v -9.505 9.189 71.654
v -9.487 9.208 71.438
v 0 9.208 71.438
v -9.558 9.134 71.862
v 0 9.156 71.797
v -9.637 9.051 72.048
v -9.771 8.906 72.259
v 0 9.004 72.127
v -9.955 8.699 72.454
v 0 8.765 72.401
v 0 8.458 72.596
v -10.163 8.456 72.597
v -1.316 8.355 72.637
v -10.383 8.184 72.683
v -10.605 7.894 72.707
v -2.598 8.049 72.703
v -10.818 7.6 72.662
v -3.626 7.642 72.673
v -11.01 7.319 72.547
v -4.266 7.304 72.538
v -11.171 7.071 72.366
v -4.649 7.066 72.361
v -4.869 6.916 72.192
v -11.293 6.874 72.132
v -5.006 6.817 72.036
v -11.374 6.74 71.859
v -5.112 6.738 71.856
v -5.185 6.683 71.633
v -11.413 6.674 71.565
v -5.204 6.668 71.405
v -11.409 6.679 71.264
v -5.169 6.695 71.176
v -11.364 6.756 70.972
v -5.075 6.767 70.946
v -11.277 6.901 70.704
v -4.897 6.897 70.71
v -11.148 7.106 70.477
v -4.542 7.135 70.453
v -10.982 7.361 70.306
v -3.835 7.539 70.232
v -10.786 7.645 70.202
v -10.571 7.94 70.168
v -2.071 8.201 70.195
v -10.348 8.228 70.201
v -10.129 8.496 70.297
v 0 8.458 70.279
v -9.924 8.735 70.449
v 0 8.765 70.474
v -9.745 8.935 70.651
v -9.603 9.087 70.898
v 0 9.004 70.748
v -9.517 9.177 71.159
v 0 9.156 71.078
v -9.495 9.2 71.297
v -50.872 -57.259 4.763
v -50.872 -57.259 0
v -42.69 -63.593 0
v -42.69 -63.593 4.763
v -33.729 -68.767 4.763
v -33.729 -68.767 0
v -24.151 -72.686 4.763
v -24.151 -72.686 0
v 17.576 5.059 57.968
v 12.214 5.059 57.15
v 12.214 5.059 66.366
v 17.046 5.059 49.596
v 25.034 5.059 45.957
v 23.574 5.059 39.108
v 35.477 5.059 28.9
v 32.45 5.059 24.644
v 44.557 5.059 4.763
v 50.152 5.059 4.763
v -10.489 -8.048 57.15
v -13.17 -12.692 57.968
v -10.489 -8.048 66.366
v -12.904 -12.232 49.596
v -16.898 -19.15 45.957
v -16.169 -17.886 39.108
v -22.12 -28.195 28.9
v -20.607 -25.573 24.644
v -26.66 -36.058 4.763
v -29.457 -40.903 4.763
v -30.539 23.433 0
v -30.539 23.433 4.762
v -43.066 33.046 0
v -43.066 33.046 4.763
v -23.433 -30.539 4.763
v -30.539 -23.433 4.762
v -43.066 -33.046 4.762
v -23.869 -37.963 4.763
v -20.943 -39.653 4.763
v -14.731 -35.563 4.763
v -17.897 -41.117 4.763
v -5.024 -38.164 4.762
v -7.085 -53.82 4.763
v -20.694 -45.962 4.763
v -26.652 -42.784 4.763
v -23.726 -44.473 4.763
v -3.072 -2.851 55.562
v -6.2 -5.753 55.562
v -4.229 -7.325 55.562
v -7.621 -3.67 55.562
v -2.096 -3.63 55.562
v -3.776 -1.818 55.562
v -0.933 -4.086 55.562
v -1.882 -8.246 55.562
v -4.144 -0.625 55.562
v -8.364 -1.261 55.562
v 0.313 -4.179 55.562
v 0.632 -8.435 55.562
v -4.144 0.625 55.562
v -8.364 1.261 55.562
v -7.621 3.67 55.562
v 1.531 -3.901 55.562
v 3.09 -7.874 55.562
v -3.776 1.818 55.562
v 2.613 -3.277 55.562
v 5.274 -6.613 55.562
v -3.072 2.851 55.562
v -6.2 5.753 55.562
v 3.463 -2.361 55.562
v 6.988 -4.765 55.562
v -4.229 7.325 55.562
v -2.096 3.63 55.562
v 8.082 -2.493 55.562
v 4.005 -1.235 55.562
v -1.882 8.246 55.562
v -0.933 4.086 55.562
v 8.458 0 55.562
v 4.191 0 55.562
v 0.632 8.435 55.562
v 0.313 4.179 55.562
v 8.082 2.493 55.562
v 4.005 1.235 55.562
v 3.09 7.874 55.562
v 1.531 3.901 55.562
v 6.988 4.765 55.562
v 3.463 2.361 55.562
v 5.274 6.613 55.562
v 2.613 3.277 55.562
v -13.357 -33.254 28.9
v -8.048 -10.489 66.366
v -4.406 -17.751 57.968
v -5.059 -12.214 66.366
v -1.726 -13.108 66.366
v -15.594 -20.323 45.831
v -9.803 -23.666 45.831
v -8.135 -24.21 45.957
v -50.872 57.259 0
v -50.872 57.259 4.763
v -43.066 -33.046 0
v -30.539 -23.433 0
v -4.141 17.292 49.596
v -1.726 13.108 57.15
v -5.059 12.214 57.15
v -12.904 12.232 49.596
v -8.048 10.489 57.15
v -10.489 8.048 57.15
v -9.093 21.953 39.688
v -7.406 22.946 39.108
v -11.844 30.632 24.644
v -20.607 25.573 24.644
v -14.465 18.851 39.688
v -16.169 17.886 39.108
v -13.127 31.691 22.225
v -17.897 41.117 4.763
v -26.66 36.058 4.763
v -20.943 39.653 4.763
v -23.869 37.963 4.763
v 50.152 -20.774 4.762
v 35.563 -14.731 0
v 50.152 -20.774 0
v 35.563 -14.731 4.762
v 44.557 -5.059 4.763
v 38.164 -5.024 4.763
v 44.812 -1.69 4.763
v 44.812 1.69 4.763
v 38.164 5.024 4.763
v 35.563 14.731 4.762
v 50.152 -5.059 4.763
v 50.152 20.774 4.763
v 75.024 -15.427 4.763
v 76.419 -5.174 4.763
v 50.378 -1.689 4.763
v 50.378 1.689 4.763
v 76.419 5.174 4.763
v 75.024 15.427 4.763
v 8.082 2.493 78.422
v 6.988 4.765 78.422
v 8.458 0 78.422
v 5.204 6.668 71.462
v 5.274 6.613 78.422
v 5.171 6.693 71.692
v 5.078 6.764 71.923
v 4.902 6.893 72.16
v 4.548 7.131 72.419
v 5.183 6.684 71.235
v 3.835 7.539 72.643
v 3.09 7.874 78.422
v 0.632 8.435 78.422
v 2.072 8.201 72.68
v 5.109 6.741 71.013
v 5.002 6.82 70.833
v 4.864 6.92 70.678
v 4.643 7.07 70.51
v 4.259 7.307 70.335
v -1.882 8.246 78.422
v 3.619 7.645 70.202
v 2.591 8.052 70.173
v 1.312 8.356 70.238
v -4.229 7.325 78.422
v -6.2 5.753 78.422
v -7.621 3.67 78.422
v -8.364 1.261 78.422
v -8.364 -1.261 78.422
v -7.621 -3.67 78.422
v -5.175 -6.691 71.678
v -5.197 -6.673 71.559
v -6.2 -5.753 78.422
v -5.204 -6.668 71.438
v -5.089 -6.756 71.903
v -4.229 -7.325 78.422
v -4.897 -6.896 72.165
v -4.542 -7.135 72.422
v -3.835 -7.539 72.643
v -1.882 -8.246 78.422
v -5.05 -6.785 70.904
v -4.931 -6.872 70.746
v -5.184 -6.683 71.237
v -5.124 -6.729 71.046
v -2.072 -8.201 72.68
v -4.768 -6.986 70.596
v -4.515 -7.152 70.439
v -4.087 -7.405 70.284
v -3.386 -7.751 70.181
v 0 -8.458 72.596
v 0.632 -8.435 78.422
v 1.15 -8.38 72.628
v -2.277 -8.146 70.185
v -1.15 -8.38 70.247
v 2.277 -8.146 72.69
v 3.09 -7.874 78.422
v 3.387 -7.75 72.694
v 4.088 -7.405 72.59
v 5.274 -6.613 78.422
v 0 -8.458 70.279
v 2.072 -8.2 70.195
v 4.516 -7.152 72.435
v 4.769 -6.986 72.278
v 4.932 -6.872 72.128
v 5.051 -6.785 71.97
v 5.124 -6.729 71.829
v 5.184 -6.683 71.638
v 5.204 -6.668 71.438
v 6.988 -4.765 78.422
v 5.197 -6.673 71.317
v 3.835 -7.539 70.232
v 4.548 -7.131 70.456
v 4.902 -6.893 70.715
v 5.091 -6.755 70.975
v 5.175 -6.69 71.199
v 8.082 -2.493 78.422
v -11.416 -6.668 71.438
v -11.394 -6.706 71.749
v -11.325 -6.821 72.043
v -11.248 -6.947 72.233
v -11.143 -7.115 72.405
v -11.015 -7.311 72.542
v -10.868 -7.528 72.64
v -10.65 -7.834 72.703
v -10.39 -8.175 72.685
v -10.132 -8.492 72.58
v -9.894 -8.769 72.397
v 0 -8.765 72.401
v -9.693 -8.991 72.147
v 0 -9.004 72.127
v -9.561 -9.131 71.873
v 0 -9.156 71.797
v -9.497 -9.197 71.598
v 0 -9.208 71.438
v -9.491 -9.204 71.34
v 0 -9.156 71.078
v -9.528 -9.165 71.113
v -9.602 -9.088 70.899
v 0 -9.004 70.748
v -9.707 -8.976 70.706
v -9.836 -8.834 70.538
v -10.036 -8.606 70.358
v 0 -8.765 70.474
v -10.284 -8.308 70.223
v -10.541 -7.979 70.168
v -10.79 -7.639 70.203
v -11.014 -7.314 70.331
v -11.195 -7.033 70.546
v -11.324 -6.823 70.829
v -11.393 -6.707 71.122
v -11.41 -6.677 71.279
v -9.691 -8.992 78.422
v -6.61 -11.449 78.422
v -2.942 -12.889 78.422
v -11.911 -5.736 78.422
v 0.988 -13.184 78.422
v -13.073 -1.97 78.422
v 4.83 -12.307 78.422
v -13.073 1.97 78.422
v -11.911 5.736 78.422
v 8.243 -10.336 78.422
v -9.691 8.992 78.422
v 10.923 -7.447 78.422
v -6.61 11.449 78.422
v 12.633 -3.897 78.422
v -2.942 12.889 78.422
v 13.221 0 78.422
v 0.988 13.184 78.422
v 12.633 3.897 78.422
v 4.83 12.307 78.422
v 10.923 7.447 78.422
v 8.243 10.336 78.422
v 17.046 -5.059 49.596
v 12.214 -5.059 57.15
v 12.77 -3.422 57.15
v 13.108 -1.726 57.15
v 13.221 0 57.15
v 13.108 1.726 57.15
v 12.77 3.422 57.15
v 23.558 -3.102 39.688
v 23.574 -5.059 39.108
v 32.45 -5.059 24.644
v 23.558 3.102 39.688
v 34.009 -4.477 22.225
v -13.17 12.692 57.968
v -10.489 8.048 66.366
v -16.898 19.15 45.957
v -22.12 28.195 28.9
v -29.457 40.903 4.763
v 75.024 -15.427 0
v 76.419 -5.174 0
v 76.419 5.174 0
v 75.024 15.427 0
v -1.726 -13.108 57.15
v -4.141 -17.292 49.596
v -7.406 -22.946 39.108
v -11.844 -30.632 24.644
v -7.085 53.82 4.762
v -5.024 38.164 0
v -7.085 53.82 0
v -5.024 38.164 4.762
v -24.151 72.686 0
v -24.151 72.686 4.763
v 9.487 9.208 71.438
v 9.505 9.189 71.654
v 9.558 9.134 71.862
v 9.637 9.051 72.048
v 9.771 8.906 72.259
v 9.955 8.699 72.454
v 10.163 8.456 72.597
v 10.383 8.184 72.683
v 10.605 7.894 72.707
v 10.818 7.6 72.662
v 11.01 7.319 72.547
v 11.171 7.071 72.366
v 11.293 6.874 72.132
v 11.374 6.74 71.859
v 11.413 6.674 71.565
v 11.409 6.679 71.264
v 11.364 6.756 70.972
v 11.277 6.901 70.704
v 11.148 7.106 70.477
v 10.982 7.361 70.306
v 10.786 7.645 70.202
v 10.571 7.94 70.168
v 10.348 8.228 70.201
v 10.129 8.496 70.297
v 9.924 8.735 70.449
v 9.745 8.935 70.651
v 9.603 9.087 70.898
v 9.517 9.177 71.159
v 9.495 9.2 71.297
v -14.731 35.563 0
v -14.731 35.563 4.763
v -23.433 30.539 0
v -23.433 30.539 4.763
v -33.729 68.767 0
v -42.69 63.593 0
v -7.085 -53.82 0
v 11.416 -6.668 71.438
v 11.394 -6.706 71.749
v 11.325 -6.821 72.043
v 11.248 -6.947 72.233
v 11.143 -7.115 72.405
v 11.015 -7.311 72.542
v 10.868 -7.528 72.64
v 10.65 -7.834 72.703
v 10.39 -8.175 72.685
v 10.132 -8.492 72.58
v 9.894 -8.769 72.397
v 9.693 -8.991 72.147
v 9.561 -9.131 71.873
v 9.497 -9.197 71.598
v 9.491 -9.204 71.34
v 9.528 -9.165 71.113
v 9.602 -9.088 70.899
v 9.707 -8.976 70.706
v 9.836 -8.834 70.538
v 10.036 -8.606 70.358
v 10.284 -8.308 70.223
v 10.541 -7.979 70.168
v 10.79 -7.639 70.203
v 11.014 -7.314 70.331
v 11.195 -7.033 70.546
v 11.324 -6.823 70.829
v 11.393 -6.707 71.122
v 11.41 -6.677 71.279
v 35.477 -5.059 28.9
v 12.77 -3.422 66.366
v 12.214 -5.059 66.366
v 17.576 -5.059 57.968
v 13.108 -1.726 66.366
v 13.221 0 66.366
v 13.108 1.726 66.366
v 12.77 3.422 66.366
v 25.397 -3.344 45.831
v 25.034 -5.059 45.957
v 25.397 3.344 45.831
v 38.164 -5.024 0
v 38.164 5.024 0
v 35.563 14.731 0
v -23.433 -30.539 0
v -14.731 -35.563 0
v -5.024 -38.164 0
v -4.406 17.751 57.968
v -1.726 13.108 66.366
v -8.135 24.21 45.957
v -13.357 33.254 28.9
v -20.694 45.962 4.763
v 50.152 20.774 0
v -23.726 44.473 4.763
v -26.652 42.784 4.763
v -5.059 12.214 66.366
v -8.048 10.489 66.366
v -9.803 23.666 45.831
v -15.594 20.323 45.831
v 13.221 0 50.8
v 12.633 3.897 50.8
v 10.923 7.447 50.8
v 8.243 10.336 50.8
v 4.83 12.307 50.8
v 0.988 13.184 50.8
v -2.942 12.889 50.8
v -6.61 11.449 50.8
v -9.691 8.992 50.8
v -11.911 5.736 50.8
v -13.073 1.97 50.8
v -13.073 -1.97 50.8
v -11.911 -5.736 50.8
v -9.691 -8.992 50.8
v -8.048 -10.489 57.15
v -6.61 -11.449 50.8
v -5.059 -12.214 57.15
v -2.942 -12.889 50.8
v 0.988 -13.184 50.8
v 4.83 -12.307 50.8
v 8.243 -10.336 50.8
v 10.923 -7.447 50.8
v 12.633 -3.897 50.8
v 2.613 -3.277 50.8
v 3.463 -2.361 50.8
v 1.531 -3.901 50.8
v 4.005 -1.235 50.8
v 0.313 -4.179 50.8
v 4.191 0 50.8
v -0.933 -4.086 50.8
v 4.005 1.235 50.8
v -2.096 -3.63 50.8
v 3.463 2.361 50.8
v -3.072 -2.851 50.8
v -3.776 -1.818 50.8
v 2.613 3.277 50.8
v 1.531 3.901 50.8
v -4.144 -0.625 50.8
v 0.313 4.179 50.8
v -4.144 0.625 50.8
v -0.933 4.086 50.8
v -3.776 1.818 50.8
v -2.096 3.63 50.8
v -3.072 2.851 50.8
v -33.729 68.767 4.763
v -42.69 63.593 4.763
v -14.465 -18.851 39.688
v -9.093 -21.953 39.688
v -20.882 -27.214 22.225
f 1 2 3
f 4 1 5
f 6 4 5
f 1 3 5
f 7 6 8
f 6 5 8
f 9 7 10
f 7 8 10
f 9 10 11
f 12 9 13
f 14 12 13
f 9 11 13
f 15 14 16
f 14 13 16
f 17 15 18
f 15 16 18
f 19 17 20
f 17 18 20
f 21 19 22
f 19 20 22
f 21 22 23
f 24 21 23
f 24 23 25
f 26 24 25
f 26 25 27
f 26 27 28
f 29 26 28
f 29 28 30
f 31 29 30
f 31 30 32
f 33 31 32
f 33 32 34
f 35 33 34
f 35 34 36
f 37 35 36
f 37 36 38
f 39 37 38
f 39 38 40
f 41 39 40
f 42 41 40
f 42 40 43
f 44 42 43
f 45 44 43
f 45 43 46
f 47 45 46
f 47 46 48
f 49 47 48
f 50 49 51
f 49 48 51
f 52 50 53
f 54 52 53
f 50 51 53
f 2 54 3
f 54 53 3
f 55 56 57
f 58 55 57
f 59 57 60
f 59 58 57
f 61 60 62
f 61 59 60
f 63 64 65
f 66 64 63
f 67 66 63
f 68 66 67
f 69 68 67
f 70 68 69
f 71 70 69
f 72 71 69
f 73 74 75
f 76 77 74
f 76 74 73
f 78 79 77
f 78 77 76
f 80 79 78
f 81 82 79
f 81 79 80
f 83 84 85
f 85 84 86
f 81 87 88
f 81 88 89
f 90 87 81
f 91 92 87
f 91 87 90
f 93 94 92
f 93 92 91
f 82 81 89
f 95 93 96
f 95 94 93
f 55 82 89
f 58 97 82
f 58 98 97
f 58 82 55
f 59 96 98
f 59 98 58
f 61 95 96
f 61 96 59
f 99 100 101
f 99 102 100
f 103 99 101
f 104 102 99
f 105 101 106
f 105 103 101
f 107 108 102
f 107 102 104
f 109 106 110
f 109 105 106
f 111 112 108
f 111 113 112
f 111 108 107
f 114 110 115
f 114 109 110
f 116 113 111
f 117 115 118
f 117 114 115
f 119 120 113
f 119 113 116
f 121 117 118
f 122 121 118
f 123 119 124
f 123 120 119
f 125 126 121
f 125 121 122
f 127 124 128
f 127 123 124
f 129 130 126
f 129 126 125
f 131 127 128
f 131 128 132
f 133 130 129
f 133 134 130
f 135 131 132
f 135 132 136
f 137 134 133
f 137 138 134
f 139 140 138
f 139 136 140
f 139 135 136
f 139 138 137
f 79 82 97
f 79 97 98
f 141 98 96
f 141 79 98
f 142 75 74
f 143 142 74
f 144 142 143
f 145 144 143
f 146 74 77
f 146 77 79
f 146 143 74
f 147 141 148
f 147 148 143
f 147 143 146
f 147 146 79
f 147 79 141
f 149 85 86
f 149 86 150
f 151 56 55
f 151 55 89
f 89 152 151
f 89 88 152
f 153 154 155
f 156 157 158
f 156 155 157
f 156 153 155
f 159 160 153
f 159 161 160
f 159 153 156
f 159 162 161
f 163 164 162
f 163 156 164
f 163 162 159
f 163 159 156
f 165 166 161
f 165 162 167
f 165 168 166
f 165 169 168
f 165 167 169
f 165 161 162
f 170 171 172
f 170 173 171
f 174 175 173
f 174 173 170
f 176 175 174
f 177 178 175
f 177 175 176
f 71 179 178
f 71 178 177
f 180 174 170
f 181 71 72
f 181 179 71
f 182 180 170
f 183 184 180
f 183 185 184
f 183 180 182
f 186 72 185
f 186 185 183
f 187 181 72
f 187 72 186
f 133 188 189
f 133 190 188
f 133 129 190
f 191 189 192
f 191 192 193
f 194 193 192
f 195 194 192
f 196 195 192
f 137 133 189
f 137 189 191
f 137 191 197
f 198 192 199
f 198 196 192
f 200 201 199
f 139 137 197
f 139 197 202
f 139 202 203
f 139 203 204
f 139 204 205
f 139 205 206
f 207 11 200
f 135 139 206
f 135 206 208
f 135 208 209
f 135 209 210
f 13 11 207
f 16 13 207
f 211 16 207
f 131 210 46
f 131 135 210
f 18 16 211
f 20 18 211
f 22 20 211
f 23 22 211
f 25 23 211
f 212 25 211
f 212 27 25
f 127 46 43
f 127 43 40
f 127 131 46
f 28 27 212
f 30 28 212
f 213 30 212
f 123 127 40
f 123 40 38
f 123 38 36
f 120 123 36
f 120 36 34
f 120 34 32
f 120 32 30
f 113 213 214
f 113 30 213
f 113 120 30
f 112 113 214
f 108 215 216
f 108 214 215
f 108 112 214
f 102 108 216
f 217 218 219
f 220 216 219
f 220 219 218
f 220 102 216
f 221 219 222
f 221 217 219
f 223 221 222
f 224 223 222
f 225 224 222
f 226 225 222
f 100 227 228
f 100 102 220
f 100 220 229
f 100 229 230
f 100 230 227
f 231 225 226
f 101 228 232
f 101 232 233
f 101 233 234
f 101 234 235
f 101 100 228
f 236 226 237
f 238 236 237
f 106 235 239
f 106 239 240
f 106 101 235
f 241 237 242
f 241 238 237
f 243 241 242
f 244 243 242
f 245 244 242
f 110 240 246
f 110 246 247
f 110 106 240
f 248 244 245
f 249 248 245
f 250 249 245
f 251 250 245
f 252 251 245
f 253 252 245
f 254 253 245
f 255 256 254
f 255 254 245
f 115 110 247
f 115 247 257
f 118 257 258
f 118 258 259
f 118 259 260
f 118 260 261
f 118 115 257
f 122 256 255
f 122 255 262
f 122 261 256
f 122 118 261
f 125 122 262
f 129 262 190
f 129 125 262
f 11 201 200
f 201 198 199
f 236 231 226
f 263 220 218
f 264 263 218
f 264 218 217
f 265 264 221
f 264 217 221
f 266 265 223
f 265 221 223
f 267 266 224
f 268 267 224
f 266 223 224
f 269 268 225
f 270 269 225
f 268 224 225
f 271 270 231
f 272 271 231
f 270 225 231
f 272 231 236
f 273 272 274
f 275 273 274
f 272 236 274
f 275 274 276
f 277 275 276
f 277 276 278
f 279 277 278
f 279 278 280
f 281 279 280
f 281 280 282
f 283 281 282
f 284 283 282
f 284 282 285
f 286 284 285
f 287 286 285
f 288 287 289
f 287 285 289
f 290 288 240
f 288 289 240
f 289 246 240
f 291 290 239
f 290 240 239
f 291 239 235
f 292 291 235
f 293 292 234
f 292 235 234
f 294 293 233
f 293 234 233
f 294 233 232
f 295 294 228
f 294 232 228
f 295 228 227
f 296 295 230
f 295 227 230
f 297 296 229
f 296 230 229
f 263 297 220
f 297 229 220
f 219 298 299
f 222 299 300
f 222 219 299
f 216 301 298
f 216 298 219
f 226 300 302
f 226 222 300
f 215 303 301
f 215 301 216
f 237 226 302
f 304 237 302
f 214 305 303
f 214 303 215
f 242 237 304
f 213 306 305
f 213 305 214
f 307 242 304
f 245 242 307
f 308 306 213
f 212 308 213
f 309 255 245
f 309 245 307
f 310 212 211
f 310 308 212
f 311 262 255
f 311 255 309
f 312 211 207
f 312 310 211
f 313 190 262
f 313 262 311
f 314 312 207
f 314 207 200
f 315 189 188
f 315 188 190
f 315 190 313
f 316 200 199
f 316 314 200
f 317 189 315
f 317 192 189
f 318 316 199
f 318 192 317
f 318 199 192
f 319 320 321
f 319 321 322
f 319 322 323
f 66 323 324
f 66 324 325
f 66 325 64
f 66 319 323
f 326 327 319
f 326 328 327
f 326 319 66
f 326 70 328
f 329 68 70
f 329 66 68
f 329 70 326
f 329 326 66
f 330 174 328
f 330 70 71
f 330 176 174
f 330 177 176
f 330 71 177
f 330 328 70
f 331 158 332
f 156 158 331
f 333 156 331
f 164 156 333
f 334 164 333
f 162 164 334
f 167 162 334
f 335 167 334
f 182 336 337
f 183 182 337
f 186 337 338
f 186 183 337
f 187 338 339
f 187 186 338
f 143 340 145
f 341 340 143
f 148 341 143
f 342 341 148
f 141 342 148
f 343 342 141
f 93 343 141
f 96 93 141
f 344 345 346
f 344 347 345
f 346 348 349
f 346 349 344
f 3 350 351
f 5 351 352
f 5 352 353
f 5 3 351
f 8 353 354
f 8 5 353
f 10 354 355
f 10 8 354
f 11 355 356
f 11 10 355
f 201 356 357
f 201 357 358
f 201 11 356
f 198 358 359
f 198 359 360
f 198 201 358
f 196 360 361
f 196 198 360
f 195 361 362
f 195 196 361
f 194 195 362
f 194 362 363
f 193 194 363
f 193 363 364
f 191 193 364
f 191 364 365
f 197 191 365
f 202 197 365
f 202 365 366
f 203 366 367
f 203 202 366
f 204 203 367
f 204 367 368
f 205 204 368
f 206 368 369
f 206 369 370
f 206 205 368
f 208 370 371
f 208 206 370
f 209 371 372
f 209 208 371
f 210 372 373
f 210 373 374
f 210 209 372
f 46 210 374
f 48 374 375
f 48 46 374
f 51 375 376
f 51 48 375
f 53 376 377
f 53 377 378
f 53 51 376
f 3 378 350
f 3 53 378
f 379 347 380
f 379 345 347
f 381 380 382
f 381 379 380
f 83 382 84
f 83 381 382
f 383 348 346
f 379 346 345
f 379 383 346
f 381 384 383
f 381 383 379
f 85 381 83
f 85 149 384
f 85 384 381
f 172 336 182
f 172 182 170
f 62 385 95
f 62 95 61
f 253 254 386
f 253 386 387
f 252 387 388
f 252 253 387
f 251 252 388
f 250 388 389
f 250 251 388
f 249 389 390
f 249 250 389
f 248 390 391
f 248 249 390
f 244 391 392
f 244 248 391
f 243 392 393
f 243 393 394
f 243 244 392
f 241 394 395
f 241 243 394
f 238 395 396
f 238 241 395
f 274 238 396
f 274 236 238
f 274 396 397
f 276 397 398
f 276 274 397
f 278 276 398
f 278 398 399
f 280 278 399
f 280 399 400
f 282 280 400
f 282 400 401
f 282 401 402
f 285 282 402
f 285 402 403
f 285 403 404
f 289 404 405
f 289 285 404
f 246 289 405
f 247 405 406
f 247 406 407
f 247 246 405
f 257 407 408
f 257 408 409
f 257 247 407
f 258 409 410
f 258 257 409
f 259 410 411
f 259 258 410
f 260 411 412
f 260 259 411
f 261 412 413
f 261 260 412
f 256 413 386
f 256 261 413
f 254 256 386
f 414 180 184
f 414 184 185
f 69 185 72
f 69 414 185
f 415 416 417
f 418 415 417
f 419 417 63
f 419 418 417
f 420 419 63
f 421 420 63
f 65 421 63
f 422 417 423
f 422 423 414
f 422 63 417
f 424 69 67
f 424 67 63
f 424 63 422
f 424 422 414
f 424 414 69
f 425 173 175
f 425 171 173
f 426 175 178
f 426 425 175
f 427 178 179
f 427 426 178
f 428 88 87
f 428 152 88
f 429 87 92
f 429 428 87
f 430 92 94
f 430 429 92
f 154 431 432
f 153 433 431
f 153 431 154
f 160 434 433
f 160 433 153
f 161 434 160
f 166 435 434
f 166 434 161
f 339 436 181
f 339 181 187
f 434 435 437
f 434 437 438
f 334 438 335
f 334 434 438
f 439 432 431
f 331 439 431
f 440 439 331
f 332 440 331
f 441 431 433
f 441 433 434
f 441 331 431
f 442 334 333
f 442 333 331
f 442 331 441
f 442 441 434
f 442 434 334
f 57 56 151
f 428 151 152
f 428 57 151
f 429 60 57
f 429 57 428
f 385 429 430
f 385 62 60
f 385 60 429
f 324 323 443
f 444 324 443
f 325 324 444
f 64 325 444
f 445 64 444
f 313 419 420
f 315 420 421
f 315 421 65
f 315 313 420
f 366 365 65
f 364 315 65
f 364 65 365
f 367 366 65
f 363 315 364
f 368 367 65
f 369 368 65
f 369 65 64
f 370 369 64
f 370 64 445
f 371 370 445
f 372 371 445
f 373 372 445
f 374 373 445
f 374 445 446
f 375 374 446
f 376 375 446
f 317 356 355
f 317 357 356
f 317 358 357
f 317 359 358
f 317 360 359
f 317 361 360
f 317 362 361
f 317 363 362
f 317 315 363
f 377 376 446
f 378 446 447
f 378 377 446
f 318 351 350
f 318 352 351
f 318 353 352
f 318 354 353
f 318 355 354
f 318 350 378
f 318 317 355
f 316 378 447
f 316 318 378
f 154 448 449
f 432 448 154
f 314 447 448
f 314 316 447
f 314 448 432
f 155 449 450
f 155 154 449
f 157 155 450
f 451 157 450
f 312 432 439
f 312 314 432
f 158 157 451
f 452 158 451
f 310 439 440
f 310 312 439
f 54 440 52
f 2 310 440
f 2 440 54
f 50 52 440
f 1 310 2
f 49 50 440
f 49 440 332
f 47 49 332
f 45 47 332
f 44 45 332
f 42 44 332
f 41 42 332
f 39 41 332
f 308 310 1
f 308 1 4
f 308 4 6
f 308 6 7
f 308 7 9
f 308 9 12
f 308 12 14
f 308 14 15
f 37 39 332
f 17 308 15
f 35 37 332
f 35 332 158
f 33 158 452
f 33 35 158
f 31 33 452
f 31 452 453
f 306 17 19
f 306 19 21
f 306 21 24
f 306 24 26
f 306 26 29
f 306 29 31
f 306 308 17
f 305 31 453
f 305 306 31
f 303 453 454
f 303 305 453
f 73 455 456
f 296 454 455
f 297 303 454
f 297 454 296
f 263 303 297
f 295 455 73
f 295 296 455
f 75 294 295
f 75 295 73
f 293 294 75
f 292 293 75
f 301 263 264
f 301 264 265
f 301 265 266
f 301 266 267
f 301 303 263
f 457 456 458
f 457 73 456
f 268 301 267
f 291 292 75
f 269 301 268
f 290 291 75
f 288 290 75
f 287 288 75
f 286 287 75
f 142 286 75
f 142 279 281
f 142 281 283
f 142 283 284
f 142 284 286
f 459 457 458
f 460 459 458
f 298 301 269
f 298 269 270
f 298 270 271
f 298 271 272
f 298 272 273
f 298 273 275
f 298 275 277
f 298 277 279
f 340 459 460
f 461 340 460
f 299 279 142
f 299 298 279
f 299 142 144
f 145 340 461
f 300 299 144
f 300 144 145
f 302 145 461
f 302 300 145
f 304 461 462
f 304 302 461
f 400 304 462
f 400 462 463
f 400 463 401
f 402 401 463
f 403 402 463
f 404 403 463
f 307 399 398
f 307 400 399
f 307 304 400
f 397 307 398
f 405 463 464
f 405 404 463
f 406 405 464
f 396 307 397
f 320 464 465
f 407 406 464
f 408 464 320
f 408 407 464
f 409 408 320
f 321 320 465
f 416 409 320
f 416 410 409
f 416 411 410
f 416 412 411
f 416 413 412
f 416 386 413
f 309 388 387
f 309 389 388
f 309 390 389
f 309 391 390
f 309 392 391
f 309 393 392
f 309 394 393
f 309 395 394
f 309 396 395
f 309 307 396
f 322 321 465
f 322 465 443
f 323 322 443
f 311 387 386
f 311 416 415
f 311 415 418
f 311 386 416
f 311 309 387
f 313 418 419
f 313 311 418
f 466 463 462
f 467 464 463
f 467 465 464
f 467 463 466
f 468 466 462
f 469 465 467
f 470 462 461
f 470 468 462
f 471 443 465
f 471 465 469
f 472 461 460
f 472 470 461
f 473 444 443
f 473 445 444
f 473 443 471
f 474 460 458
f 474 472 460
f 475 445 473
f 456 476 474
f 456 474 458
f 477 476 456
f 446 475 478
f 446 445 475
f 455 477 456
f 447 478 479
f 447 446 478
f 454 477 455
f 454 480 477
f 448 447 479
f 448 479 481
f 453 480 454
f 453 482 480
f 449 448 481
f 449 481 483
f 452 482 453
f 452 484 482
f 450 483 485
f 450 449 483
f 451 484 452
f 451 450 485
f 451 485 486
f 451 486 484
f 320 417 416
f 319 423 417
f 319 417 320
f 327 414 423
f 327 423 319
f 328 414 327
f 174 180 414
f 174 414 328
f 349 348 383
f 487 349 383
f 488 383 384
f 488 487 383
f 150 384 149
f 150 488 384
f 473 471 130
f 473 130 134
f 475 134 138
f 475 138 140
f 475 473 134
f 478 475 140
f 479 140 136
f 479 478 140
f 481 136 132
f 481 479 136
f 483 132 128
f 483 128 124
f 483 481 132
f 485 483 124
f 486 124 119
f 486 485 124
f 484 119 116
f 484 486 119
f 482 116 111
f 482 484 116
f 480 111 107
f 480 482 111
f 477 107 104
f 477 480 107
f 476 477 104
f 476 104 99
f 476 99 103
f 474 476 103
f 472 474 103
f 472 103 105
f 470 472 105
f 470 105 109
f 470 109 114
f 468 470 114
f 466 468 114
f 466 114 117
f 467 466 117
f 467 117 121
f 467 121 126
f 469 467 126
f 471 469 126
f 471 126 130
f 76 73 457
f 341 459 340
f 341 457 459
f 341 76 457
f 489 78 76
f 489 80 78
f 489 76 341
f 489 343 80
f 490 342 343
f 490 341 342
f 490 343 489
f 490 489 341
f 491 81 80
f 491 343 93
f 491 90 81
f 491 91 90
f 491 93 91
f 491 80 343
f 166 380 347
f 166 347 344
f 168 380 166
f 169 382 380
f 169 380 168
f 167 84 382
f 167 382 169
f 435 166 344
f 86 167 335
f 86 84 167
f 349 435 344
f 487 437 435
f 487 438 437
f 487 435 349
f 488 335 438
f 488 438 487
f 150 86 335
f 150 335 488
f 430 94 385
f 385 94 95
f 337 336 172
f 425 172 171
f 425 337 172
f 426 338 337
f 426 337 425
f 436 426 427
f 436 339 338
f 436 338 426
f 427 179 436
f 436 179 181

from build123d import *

# Parameters (mm, degrees)
F3_ANGLE_BACK  = 22.5
F3_ANGLE       = 45
F5_START       = 4.7625
F5_DEPTH       = 73.661
F7_DEPTH       = 78.4235
F8_COUNT       = 3
F9_R           = 1.27
F10_DEPTH      = 50.8733057387
F10_DEPTH_BACK = 76.59454776


with BuildPart() as f1:
    # F0 (on Front) → F1 (revolve)
    with BuildSketch(Plane.XZ):
        Polygon((13.2207, 50.8), (13.2207, 78.4225), (8.4582, 78.4225), (8.4582, 55.5625), (4.191, 55.5625), (4.191, 50.8), align=None)
    revolve(axis=Axis((0, 0, 76.2090291828), (0, 0, 1)))

    # F2 (on Front) → F3 (revolve)
    with BuildSketch(Plane.XZ, mode=Mode.PRIVATE) as f3_sk:
        Polygon((50.40645224, 4.7625), (13.2207, 66.3656993785), (13.2207, 57.15), (44.84354776, 4.7625), (38.49354776, 4.7625), (38.49354776, 0), (76.59354776, 0), (76.59354776, 4.7625), align=None)
    revolve(f3_sk.sketch.rotate(Axis((0, 0, 76.2090291828), (0, 0, 1)), -F3_ANGLE_BACK), axis=Axis((0, 0, 76.2090291828), (0, 0, 1)), revolution_arc=F3_ANGLE)

    # F4 (on Top) → F5 (cut)
    with BuildSketch(Plane.XY.offset(F5_START)):
        Polygon((12.2143341355, 33.2312490207), (12.2143341355, 5.0593428543), (63.5, 5.0593428543), (63.5, -5.0593428543), (12.2143341355, -5.0593428543), (12.2143341355, -33.2312490207), (78.2526575172, -33.2312490207), (78.2526575172, 33.2312490207), align=None)
    extrude(amount=F5_DEPTH, mode=Mode.SUBTRACT)

    # F6 (on Top) → F7 (cut, through all)
    with BuildSketch(Plane.XY):
        Polygon((50.1519040247, 31.7581439537), (50.1519040247, 20.7735988259), (87.7114310861, 12.7), (87.7114310861, -12.7), (50.1519040247, -20.7735988259), (50.1519040247, -36.5923251011), (108.705951746, -36.5923251011), (108.705951746, 31.7581439537), align=None)
    extrude(amount=F7_DEPTH, mode=Mode.SUBTRACT)

    # F8: F1 ×3 about axis
    f8_axis = Axis((0, 0, 76.2090291828), (0, 0, 1))


with BuildPart() as f1_1:
    add(f1.part)
    for i in range(1, F8_COUNT):
        add(f1.part.rotate(f8_axis, i * 360 / F8_COUNT))

    # F9 (on Right) → F10 (cut, two sides)
    with BuildSketch(Plane.YZ) as f10_sk:
        with Locations((-7.9375, 71.4375)):
            Circle(F9_R)
        with Locations((7.9375, 71.4375)):
            Circle(F9_R)
    extrude(amount=-F10_DEPTH, mode=Mode.SUBTRACT)
    extrude(f10_sk.sketch, amount=F10_DEPTH_BACK, mode=Mode.SUBTRACT)


solid = f1_1.part
